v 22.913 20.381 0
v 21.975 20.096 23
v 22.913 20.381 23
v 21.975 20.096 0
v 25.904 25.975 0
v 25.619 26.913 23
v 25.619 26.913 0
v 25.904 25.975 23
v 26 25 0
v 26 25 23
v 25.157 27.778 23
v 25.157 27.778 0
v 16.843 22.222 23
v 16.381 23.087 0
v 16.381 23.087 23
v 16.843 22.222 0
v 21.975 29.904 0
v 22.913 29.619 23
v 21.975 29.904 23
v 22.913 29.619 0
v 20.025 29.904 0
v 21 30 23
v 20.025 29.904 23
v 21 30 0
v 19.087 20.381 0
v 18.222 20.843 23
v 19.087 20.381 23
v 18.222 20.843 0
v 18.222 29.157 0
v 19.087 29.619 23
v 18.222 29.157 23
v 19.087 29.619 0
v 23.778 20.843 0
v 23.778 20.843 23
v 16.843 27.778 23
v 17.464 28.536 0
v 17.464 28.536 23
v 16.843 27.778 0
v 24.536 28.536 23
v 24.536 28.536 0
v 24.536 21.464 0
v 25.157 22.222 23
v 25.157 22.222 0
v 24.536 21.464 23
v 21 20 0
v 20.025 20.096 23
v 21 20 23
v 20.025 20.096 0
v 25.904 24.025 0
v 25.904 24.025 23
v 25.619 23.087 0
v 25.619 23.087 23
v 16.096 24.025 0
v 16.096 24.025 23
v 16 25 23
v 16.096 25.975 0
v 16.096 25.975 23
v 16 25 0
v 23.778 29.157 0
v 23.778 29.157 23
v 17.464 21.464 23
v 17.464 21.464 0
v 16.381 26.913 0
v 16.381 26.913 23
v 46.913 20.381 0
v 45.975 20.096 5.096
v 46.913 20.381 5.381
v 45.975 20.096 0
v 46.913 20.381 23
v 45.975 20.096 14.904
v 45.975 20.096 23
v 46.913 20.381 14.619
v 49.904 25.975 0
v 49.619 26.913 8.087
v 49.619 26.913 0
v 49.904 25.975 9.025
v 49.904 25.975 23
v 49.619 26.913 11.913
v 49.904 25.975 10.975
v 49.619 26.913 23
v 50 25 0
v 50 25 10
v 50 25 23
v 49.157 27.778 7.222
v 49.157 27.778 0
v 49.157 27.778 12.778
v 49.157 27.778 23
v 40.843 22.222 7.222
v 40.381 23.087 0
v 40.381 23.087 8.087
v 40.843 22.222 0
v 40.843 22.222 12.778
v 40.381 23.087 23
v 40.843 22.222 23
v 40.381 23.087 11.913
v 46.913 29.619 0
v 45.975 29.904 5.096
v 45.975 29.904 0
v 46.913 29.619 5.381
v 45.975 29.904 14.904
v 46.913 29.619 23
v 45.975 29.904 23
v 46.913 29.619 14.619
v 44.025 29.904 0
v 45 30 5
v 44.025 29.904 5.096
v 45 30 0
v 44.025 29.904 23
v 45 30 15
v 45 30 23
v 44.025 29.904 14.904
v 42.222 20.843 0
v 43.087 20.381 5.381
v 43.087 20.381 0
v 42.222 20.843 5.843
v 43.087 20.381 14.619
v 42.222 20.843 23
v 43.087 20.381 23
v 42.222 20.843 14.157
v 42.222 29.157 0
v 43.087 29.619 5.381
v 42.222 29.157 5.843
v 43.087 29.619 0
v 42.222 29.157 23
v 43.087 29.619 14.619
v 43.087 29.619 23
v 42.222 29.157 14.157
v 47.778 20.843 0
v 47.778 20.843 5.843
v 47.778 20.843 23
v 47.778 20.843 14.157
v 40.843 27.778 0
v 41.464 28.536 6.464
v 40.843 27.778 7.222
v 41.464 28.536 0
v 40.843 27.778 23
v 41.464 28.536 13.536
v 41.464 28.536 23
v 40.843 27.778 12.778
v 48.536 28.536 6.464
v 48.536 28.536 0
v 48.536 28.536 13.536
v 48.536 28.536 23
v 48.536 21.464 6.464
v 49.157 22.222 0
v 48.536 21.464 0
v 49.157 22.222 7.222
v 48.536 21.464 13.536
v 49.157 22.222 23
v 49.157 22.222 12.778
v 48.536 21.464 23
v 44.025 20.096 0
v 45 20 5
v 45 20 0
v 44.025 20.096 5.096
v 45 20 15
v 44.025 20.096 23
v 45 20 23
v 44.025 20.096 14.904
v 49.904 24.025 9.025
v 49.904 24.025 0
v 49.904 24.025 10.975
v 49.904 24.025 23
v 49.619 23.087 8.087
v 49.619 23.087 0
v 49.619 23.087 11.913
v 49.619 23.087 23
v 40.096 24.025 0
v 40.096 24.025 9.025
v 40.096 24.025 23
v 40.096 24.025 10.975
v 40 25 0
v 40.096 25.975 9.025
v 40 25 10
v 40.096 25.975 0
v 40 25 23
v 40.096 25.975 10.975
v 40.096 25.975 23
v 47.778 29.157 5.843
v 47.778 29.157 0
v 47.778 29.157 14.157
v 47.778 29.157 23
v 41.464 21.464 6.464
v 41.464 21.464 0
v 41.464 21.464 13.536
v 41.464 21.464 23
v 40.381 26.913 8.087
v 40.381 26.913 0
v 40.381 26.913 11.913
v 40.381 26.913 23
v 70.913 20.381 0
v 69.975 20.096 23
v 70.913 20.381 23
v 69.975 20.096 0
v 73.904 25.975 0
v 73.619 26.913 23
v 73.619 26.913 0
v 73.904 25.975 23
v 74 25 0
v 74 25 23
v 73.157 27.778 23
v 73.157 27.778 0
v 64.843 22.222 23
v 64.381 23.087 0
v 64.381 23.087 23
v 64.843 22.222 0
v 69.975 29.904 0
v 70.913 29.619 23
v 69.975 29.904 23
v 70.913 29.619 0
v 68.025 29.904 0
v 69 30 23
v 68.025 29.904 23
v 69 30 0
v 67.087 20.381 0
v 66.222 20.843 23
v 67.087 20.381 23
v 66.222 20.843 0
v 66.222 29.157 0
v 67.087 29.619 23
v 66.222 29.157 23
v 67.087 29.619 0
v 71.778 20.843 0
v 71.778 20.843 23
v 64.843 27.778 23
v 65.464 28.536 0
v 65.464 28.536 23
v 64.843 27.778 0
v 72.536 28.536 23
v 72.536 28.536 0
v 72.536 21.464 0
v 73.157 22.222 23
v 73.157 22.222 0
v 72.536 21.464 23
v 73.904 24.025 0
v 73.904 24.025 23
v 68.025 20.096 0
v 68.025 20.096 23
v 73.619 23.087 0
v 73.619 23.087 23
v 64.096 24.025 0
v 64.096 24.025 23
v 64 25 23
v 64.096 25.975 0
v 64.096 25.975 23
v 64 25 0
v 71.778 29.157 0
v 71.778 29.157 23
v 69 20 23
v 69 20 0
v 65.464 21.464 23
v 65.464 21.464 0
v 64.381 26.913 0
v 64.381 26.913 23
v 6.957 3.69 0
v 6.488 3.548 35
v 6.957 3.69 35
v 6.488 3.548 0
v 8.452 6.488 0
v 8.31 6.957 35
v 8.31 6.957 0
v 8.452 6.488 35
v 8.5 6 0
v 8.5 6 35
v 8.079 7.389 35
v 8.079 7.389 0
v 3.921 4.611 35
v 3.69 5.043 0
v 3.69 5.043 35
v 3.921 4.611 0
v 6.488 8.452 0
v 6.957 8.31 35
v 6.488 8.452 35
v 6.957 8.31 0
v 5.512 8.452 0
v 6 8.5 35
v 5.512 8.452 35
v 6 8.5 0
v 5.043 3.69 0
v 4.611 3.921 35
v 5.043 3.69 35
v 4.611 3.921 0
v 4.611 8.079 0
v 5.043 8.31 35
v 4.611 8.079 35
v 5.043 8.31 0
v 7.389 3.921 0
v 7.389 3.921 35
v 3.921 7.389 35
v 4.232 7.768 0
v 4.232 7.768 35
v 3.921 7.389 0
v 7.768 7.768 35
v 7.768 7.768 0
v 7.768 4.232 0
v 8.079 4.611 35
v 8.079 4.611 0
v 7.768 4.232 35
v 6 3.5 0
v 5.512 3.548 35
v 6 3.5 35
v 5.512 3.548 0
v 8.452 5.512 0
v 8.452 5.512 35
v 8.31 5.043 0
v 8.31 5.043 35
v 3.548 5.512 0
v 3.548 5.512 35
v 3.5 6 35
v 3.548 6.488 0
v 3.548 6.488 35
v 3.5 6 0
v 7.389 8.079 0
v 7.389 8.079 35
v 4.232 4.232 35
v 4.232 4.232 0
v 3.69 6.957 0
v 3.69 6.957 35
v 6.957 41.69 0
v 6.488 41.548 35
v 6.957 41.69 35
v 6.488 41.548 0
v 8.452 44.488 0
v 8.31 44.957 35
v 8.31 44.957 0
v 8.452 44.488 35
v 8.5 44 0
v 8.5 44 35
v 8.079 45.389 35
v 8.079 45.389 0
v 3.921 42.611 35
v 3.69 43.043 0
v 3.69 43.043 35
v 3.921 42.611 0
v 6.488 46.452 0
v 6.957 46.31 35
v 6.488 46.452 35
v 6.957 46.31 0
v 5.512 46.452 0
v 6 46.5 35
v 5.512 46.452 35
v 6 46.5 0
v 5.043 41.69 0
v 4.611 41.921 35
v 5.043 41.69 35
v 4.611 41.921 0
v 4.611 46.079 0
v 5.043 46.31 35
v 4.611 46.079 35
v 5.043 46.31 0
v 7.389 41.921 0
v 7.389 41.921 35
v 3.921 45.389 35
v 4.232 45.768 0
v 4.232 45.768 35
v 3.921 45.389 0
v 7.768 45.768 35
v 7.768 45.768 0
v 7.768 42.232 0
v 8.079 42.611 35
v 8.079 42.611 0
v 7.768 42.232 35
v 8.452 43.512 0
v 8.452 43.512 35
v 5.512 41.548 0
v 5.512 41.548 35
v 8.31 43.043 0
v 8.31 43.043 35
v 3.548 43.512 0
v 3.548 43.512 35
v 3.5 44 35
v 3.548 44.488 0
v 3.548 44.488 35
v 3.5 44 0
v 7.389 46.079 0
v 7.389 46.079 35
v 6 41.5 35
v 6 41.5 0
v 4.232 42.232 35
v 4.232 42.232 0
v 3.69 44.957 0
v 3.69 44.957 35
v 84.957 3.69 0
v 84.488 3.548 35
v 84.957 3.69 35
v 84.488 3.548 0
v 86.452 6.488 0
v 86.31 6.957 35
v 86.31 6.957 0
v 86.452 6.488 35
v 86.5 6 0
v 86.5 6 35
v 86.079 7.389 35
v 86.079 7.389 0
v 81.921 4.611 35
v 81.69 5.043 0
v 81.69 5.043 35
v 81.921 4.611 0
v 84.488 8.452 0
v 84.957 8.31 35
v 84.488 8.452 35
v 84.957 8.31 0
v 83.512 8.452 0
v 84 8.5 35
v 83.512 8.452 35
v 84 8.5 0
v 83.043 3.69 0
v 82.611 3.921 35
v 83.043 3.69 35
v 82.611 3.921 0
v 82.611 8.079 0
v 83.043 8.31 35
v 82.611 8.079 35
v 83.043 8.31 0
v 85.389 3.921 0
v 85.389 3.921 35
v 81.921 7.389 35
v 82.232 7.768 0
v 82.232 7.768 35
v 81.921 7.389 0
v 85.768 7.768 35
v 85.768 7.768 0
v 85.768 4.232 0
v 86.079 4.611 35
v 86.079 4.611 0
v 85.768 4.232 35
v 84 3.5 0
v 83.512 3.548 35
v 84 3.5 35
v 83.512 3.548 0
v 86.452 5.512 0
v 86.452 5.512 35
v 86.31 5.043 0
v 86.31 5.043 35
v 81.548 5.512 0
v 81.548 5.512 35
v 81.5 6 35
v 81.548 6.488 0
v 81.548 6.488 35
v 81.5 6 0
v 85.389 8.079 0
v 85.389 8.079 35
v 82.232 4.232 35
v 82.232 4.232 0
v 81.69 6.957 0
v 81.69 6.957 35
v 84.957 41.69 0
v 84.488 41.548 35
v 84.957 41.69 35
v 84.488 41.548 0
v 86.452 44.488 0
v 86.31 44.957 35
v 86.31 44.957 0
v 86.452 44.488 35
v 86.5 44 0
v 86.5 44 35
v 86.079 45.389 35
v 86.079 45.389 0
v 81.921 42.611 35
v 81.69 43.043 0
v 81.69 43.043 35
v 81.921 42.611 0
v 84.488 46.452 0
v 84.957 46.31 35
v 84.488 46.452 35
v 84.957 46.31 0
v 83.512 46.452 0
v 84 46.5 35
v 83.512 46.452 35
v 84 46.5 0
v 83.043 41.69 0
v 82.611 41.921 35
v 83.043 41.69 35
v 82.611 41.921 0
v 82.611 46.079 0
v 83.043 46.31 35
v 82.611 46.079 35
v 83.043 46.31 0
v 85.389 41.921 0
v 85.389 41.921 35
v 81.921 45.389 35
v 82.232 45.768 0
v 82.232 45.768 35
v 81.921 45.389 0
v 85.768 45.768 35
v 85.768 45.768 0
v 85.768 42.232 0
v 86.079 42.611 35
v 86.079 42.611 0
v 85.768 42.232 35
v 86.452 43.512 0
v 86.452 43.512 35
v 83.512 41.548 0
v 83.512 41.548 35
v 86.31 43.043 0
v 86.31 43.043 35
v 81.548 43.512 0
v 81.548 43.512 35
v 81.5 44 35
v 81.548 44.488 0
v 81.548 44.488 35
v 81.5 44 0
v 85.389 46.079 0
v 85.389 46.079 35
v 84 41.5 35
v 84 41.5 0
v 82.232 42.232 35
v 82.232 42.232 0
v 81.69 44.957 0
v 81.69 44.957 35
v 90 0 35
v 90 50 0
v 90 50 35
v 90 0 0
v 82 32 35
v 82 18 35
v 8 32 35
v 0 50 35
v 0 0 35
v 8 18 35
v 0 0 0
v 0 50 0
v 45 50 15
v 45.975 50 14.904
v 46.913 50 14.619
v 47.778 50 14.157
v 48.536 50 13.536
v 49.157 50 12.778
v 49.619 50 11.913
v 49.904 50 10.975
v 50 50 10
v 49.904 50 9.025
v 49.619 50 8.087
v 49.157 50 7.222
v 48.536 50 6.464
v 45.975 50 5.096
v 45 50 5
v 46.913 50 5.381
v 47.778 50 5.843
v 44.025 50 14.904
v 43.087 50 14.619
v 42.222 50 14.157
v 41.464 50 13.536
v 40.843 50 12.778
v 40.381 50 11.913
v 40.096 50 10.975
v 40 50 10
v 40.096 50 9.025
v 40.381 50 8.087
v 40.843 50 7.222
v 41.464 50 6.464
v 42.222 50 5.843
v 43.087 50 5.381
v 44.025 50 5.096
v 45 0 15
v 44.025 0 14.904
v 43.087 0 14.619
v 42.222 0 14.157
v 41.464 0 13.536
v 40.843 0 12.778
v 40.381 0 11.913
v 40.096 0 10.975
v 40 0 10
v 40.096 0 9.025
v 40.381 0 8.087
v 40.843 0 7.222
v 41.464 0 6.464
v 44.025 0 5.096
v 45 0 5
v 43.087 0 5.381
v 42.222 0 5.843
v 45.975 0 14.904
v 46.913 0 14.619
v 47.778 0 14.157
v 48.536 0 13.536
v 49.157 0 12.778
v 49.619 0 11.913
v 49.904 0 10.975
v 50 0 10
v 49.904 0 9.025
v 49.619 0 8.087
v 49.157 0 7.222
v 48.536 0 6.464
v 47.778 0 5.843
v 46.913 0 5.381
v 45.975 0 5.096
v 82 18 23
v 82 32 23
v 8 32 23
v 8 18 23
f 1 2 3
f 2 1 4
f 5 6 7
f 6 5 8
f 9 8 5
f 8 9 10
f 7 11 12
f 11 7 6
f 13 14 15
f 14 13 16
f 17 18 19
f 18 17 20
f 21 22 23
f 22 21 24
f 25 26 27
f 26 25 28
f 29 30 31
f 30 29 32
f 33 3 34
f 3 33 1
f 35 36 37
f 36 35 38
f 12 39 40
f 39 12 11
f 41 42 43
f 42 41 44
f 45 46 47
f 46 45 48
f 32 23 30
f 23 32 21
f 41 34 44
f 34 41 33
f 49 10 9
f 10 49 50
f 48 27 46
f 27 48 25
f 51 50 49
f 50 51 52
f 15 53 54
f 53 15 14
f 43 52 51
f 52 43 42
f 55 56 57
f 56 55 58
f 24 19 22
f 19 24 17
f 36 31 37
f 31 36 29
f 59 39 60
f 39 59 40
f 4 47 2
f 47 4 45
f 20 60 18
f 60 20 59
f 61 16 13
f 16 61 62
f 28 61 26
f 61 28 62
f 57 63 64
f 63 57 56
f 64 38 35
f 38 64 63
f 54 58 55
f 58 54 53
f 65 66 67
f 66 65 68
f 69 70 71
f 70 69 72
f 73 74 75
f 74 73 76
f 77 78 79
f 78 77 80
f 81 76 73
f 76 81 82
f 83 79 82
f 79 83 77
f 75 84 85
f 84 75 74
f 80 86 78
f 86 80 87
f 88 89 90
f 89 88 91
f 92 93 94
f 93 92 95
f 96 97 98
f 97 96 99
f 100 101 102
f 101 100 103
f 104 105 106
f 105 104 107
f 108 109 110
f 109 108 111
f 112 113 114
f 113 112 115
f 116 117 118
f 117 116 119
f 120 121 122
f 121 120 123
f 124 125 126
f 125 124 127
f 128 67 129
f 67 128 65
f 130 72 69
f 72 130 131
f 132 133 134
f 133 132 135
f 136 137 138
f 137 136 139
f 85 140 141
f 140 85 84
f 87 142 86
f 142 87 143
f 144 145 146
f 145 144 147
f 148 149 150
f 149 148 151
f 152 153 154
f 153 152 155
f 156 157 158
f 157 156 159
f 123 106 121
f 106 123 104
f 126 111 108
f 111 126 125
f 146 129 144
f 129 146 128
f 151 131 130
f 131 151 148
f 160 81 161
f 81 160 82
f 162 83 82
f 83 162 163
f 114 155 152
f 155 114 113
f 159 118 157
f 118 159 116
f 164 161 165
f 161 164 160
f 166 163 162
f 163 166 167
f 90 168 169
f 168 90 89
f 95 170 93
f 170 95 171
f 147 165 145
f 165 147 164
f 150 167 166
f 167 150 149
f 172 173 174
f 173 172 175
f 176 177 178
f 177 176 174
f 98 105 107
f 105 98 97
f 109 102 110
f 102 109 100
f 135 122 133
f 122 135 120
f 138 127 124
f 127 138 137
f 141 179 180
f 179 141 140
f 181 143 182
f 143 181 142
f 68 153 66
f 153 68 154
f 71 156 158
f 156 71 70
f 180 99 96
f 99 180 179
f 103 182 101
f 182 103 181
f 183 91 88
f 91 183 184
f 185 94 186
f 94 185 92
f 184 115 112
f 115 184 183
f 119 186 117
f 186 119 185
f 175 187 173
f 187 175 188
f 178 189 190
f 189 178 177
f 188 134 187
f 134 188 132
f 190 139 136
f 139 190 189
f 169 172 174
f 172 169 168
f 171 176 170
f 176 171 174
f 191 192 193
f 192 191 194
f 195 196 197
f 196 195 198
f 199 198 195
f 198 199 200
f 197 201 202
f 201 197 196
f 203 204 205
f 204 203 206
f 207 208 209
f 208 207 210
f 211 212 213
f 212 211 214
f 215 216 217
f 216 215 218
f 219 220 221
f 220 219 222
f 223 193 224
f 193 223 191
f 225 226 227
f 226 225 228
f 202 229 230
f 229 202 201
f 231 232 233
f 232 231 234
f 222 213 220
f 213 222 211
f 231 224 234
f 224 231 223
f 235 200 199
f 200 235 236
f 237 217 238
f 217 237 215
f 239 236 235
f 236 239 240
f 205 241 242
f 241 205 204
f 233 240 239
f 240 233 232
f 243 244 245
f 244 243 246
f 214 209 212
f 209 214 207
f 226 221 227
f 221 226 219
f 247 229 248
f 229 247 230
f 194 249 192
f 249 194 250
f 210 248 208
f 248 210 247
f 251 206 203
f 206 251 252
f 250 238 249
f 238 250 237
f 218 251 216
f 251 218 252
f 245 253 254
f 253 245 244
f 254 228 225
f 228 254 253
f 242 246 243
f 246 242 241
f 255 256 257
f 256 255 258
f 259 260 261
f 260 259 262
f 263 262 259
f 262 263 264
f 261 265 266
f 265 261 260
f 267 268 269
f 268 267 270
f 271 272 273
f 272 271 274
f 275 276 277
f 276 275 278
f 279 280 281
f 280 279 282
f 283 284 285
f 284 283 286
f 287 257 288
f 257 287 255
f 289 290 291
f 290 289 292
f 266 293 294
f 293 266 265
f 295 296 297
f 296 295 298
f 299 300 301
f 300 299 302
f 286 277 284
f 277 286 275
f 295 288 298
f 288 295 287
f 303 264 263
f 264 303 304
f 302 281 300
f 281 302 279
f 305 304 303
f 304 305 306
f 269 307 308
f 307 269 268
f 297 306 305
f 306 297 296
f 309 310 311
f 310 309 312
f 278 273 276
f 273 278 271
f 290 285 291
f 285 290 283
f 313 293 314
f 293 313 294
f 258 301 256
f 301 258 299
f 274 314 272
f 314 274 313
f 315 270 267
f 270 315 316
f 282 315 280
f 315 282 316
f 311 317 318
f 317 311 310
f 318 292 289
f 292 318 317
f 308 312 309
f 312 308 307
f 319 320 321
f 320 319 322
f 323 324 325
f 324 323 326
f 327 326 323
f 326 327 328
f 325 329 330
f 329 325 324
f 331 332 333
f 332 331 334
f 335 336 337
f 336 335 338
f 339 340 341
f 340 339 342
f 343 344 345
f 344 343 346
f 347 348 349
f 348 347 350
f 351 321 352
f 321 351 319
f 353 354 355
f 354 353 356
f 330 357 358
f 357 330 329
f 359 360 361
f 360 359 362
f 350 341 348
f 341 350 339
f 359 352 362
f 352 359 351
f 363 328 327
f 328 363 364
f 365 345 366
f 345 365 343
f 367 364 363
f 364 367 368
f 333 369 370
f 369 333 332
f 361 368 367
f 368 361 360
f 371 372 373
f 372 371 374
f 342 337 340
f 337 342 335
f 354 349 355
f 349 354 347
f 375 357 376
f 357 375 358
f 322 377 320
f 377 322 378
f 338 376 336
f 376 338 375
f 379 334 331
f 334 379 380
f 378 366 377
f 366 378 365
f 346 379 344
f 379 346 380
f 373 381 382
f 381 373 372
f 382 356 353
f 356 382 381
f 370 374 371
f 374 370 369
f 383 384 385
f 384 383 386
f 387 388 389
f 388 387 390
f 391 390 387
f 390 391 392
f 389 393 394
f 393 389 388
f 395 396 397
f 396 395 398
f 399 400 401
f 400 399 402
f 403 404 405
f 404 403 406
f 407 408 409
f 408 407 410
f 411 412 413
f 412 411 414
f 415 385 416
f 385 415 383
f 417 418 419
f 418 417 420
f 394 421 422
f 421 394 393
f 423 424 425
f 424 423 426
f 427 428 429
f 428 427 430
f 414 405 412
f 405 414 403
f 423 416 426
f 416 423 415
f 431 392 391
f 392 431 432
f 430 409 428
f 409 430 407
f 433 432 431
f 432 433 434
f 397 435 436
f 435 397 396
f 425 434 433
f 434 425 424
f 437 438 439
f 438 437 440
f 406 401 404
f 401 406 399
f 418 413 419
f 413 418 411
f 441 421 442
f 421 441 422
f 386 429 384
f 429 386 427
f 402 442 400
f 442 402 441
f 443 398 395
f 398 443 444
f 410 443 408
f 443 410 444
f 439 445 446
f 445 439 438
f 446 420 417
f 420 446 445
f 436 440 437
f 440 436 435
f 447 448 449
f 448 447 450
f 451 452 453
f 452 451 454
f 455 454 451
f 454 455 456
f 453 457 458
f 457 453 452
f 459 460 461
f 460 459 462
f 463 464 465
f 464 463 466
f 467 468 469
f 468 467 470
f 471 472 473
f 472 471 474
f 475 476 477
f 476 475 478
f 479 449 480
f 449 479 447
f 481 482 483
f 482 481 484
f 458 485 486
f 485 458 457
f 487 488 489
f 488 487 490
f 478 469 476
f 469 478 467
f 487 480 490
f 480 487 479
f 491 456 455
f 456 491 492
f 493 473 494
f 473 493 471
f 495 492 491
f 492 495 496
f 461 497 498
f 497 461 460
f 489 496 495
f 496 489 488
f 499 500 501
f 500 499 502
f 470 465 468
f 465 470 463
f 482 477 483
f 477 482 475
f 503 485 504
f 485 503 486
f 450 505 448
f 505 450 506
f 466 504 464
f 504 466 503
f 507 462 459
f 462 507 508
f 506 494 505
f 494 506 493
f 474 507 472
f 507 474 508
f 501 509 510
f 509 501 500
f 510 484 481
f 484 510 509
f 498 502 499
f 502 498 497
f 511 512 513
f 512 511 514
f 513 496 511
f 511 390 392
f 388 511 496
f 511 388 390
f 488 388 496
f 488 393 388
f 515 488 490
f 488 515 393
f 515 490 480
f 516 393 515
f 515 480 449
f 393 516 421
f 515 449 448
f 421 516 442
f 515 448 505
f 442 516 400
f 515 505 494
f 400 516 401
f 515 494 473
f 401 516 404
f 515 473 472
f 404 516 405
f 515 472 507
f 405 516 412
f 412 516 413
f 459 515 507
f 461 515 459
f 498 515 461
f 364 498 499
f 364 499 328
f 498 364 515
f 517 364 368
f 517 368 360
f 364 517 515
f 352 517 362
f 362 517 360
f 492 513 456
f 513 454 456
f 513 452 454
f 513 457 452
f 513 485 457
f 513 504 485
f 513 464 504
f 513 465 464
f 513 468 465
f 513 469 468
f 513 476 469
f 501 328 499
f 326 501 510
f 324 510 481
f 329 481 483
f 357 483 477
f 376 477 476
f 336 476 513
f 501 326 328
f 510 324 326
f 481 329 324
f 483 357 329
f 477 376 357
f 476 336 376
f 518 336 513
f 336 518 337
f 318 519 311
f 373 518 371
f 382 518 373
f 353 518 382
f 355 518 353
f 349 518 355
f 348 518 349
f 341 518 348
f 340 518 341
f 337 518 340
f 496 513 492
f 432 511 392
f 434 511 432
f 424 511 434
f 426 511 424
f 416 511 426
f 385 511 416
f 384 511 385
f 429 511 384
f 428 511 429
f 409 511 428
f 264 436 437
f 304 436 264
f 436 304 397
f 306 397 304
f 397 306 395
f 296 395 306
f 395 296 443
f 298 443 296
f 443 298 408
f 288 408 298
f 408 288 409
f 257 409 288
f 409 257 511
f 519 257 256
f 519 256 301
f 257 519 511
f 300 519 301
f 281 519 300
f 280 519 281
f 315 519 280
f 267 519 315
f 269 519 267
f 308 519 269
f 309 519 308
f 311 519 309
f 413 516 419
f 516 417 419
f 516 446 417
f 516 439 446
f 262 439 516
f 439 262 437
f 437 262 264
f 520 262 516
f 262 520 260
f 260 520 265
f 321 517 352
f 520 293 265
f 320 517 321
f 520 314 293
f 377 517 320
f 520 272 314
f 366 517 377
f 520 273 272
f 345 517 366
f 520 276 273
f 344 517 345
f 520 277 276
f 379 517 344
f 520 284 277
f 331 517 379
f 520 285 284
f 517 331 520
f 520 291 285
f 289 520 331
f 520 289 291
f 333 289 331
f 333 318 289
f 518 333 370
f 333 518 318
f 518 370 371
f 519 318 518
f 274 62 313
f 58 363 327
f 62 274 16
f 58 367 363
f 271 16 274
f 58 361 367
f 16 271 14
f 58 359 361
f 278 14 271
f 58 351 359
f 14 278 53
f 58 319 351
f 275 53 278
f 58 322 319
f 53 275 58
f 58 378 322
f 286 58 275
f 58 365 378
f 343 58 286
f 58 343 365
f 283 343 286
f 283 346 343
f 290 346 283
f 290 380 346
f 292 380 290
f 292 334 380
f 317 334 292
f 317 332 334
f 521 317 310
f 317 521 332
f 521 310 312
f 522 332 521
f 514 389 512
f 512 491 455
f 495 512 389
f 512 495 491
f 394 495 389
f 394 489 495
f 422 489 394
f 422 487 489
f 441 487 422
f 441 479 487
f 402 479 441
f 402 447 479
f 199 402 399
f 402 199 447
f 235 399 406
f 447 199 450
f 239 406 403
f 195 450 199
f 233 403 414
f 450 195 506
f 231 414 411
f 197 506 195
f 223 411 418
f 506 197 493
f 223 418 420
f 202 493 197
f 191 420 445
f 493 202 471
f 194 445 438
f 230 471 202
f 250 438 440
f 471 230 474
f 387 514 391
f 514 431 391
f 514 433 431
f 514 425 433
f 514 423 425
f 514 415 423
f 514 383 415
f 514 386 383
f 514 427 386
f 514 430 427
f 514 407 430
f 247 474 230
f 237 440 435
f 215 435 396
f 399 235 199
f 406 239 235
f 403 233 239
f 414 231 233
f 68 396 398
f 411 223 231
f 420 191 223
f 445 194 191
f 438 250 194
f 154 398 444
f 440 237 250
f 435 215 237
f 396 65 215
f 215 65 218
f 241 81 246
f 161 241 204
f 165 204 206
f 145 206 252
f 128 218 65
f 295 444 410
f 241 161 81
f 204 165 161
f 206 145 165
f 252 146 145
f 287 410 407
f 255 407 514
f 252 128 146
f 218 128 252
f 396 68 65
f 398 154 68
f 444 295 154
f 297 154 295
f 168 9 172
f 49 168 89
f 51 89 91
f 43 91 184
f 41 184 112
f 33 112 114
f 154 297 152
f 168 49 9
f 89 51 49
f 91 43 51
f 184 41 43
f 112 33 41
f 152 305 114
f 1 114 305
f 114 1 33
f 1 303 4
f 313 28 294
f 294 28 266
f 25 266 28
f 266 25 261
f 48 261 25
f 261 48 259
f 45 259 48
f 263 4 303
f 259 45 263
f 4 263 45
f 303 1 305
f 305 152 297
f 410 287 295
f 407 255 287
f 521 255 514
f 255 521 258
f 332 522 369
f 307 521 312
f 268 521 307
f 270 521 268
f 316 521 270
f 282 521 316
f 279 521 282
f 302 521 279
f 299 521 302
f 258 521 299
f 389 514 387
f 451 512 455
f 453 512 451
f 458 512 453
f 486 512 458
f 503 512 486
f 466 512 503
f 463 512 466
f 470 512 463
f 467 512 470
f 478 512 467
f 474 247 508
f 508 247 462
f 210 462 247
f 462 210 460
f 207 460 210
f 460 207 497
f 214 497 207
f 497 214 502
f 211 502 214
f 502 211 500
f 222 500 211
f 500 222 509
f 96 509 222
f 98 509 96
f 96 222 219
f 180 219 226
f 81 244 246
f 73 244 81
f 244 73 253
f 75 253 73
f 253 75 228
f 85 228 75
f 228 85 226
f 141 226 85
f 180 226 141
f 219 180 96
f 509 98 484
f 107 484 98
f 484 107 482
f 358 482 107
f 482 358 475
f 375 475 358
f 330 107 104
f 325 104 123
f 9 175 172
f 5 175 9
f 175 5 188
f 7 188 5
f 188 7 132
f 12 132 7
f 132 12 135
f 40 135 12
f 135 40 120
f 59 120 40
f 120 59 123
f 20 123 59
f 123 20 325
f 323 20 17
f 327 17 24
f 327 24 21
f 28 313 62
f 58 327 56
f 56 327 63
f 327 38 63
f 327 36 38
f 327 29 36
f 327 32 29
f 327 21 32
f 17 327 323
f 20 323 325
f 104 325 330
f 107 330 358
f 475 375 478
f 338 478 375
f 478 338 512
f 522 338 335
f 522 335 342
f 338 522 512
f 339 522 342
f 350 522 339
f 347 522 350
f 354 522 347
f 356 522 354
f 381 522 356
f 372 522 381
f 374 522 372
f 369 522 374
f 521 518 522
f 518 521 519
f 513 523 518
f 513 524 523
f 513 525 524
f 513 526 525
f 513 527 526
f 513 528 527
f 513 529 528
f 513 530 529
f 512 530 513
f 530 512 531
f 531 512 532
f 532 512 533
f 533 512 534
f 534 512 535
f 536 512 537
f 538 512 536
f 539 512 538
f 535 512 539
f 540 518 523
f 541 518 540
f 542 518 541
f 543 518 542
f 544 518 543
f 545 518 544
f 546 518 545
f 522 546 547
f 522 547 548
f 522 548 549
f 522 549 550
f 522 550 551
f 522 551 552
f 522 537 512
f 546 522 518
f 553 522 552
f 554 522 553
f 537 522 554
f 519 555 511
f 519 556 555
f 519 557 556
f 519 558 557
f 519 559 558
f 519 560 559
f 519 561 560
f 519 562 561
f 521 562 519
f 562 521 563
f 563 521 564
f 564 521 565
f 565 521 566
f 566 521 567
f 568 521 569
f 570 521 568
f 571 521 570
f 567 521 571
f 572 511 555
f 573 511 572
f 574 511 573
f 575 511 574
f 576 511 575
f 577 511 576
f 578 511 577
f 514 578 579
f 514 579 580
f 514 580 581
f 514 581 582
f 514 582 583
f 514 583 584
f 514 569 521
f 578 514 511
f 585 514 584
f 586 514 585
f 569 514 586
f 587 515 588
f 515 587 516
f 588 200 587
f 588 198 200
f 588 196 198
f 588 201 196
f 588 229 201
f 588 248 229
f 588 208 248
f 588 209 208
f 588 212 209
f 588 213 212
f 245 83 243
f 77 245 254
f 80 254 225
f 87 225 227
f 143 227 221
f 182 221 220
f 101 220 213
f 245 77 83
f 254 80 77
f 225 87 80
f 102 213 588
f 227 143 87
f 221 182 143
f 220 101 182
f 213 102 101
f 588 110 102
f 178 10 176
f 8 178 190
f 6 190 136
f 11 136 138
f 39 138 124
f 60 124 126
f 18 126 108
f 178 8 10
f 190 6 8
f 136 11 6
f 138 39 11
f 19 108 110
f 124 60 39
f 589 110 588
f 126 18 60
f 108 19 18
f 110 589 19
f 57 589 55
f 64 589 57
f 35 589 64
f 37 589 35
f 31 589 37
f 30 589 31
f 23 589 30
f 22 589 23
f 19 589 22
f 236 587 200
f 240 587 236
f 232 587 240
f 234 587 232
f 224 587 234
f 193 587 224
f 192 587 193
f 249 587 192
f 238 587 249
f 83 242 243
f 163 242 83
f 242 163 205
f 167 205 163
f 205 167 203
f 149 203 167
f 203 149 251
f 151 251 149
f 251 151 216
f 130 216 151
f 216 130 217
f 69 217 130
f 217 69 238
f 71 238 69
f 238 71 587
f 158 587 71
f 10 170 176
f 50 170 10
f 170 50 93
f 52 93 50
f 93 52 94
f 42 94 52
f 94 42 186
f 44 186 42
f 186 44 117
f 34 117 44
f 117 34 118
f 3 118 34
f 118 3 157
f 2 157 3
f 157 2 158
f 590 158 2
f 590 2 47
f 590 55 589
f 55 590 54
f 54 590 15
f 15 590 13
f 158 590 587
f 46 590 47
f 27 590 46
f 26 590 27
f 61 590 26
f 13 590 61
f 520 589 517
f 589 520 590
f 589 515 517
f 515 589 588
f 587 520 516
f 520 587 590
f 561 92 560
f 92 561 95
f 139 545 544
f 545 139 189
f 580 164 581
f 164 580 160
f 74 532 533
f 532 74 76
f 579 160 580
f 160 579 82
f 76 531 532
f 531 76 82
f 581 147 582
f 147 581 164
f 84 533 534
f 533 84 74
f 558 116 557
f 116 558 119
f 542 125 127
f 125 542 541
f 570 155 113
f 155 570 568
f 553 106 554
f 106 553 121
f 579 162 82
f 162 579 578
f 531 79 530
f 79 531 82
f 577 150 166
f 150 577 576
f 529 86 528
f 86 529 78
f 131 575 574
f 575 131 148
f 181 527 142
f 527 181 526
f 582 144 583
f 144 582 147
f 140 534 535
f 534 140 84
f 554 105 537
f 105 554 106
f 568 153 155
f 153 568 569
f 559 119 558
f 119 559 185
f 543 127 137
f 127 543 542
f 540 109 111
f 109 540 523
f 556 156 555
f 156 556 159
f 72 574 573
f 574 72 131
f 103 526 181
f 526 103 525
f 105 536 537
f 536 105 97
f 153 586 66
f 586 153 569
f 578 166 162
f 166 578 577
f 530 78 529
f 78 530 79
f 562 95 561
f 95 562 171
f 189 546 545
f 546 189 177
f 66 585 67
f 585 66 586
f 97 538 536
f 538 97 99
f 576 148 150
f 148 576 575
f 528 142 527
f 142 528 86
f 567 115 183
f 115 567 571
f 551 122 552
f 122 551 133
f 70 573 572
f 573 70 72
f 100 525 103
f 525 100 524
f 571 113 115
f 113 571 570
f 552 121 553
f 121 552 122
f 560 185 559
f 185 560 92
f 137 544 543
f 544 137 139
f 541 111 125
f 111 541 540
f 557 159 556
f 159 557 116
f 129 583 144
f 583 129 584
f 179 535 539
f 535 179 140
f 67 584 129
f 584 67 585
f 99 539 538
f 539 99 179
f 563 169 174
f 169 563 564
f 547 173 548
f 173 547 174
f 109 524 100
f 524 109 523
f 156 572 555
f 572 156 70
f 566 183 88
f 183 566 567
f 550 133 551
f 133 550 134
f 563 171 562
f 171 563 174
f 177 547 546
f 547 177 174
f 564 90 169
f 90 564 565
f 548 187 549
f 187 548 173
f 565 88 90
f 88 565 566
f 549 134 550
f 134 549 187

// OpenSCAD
$fn = 32;

// ----------------------------------------------------------------------
// Manifold block: side_outlet manifold
// ----------------------------------------------------------------------

// --- parameters (mm) ---
block_l = 90;             // block length, X
block_w = 50;             // block width, Y
block_h = 35;             // block height, Z
port_d = 10;              // port bore diameter
port_pitch = 24;          // port pitch along X
gallery_d = 14;           // top gallery width, Y
gallery_depth = 12;       // gallery pocket depth
wall_p = 8;               // gallery end wall thickness, X
mnt_d = 5;                // mounting hole diameter
mnt_in = 6;               // mounting hole inset from the edges
out_d = 10;               // outlet bore diameter
out_z = 10;               // outlet axis height

n_ports = 3;  // ports in the row
port_x0 = (block_l - (n_ports - 1) * port_pitch) / 2;  // first port X

difference() {
  cube([block_l, block_w, block_h]);
  for (i = [0 : n_ports - 1])
    translate([port_x0 + i * port_pitch, block_w / 2, -1])
      cylinder(h = block_h + 2, d = port_d);
  translate([wall_p, block_w / 2 - gallery_d / 2, block_h - gallery_depth])
    cube([block_l - 2 * wall_p, gallery_d, gallery_depth + 1]);
  for (cx = [mnt_in, block_l - mnt_in])
    for (cy = [mnt_in, block_w - mnt_in])
      translate([cx, cy, -1]) cylinder(h = block_h + 2, d = mnt_d);
  translate([block_l / 2, -1, out_z]) rotate([-90, 0, 0])
    cylinder(h = block_w + 2, d = out_d);
}
